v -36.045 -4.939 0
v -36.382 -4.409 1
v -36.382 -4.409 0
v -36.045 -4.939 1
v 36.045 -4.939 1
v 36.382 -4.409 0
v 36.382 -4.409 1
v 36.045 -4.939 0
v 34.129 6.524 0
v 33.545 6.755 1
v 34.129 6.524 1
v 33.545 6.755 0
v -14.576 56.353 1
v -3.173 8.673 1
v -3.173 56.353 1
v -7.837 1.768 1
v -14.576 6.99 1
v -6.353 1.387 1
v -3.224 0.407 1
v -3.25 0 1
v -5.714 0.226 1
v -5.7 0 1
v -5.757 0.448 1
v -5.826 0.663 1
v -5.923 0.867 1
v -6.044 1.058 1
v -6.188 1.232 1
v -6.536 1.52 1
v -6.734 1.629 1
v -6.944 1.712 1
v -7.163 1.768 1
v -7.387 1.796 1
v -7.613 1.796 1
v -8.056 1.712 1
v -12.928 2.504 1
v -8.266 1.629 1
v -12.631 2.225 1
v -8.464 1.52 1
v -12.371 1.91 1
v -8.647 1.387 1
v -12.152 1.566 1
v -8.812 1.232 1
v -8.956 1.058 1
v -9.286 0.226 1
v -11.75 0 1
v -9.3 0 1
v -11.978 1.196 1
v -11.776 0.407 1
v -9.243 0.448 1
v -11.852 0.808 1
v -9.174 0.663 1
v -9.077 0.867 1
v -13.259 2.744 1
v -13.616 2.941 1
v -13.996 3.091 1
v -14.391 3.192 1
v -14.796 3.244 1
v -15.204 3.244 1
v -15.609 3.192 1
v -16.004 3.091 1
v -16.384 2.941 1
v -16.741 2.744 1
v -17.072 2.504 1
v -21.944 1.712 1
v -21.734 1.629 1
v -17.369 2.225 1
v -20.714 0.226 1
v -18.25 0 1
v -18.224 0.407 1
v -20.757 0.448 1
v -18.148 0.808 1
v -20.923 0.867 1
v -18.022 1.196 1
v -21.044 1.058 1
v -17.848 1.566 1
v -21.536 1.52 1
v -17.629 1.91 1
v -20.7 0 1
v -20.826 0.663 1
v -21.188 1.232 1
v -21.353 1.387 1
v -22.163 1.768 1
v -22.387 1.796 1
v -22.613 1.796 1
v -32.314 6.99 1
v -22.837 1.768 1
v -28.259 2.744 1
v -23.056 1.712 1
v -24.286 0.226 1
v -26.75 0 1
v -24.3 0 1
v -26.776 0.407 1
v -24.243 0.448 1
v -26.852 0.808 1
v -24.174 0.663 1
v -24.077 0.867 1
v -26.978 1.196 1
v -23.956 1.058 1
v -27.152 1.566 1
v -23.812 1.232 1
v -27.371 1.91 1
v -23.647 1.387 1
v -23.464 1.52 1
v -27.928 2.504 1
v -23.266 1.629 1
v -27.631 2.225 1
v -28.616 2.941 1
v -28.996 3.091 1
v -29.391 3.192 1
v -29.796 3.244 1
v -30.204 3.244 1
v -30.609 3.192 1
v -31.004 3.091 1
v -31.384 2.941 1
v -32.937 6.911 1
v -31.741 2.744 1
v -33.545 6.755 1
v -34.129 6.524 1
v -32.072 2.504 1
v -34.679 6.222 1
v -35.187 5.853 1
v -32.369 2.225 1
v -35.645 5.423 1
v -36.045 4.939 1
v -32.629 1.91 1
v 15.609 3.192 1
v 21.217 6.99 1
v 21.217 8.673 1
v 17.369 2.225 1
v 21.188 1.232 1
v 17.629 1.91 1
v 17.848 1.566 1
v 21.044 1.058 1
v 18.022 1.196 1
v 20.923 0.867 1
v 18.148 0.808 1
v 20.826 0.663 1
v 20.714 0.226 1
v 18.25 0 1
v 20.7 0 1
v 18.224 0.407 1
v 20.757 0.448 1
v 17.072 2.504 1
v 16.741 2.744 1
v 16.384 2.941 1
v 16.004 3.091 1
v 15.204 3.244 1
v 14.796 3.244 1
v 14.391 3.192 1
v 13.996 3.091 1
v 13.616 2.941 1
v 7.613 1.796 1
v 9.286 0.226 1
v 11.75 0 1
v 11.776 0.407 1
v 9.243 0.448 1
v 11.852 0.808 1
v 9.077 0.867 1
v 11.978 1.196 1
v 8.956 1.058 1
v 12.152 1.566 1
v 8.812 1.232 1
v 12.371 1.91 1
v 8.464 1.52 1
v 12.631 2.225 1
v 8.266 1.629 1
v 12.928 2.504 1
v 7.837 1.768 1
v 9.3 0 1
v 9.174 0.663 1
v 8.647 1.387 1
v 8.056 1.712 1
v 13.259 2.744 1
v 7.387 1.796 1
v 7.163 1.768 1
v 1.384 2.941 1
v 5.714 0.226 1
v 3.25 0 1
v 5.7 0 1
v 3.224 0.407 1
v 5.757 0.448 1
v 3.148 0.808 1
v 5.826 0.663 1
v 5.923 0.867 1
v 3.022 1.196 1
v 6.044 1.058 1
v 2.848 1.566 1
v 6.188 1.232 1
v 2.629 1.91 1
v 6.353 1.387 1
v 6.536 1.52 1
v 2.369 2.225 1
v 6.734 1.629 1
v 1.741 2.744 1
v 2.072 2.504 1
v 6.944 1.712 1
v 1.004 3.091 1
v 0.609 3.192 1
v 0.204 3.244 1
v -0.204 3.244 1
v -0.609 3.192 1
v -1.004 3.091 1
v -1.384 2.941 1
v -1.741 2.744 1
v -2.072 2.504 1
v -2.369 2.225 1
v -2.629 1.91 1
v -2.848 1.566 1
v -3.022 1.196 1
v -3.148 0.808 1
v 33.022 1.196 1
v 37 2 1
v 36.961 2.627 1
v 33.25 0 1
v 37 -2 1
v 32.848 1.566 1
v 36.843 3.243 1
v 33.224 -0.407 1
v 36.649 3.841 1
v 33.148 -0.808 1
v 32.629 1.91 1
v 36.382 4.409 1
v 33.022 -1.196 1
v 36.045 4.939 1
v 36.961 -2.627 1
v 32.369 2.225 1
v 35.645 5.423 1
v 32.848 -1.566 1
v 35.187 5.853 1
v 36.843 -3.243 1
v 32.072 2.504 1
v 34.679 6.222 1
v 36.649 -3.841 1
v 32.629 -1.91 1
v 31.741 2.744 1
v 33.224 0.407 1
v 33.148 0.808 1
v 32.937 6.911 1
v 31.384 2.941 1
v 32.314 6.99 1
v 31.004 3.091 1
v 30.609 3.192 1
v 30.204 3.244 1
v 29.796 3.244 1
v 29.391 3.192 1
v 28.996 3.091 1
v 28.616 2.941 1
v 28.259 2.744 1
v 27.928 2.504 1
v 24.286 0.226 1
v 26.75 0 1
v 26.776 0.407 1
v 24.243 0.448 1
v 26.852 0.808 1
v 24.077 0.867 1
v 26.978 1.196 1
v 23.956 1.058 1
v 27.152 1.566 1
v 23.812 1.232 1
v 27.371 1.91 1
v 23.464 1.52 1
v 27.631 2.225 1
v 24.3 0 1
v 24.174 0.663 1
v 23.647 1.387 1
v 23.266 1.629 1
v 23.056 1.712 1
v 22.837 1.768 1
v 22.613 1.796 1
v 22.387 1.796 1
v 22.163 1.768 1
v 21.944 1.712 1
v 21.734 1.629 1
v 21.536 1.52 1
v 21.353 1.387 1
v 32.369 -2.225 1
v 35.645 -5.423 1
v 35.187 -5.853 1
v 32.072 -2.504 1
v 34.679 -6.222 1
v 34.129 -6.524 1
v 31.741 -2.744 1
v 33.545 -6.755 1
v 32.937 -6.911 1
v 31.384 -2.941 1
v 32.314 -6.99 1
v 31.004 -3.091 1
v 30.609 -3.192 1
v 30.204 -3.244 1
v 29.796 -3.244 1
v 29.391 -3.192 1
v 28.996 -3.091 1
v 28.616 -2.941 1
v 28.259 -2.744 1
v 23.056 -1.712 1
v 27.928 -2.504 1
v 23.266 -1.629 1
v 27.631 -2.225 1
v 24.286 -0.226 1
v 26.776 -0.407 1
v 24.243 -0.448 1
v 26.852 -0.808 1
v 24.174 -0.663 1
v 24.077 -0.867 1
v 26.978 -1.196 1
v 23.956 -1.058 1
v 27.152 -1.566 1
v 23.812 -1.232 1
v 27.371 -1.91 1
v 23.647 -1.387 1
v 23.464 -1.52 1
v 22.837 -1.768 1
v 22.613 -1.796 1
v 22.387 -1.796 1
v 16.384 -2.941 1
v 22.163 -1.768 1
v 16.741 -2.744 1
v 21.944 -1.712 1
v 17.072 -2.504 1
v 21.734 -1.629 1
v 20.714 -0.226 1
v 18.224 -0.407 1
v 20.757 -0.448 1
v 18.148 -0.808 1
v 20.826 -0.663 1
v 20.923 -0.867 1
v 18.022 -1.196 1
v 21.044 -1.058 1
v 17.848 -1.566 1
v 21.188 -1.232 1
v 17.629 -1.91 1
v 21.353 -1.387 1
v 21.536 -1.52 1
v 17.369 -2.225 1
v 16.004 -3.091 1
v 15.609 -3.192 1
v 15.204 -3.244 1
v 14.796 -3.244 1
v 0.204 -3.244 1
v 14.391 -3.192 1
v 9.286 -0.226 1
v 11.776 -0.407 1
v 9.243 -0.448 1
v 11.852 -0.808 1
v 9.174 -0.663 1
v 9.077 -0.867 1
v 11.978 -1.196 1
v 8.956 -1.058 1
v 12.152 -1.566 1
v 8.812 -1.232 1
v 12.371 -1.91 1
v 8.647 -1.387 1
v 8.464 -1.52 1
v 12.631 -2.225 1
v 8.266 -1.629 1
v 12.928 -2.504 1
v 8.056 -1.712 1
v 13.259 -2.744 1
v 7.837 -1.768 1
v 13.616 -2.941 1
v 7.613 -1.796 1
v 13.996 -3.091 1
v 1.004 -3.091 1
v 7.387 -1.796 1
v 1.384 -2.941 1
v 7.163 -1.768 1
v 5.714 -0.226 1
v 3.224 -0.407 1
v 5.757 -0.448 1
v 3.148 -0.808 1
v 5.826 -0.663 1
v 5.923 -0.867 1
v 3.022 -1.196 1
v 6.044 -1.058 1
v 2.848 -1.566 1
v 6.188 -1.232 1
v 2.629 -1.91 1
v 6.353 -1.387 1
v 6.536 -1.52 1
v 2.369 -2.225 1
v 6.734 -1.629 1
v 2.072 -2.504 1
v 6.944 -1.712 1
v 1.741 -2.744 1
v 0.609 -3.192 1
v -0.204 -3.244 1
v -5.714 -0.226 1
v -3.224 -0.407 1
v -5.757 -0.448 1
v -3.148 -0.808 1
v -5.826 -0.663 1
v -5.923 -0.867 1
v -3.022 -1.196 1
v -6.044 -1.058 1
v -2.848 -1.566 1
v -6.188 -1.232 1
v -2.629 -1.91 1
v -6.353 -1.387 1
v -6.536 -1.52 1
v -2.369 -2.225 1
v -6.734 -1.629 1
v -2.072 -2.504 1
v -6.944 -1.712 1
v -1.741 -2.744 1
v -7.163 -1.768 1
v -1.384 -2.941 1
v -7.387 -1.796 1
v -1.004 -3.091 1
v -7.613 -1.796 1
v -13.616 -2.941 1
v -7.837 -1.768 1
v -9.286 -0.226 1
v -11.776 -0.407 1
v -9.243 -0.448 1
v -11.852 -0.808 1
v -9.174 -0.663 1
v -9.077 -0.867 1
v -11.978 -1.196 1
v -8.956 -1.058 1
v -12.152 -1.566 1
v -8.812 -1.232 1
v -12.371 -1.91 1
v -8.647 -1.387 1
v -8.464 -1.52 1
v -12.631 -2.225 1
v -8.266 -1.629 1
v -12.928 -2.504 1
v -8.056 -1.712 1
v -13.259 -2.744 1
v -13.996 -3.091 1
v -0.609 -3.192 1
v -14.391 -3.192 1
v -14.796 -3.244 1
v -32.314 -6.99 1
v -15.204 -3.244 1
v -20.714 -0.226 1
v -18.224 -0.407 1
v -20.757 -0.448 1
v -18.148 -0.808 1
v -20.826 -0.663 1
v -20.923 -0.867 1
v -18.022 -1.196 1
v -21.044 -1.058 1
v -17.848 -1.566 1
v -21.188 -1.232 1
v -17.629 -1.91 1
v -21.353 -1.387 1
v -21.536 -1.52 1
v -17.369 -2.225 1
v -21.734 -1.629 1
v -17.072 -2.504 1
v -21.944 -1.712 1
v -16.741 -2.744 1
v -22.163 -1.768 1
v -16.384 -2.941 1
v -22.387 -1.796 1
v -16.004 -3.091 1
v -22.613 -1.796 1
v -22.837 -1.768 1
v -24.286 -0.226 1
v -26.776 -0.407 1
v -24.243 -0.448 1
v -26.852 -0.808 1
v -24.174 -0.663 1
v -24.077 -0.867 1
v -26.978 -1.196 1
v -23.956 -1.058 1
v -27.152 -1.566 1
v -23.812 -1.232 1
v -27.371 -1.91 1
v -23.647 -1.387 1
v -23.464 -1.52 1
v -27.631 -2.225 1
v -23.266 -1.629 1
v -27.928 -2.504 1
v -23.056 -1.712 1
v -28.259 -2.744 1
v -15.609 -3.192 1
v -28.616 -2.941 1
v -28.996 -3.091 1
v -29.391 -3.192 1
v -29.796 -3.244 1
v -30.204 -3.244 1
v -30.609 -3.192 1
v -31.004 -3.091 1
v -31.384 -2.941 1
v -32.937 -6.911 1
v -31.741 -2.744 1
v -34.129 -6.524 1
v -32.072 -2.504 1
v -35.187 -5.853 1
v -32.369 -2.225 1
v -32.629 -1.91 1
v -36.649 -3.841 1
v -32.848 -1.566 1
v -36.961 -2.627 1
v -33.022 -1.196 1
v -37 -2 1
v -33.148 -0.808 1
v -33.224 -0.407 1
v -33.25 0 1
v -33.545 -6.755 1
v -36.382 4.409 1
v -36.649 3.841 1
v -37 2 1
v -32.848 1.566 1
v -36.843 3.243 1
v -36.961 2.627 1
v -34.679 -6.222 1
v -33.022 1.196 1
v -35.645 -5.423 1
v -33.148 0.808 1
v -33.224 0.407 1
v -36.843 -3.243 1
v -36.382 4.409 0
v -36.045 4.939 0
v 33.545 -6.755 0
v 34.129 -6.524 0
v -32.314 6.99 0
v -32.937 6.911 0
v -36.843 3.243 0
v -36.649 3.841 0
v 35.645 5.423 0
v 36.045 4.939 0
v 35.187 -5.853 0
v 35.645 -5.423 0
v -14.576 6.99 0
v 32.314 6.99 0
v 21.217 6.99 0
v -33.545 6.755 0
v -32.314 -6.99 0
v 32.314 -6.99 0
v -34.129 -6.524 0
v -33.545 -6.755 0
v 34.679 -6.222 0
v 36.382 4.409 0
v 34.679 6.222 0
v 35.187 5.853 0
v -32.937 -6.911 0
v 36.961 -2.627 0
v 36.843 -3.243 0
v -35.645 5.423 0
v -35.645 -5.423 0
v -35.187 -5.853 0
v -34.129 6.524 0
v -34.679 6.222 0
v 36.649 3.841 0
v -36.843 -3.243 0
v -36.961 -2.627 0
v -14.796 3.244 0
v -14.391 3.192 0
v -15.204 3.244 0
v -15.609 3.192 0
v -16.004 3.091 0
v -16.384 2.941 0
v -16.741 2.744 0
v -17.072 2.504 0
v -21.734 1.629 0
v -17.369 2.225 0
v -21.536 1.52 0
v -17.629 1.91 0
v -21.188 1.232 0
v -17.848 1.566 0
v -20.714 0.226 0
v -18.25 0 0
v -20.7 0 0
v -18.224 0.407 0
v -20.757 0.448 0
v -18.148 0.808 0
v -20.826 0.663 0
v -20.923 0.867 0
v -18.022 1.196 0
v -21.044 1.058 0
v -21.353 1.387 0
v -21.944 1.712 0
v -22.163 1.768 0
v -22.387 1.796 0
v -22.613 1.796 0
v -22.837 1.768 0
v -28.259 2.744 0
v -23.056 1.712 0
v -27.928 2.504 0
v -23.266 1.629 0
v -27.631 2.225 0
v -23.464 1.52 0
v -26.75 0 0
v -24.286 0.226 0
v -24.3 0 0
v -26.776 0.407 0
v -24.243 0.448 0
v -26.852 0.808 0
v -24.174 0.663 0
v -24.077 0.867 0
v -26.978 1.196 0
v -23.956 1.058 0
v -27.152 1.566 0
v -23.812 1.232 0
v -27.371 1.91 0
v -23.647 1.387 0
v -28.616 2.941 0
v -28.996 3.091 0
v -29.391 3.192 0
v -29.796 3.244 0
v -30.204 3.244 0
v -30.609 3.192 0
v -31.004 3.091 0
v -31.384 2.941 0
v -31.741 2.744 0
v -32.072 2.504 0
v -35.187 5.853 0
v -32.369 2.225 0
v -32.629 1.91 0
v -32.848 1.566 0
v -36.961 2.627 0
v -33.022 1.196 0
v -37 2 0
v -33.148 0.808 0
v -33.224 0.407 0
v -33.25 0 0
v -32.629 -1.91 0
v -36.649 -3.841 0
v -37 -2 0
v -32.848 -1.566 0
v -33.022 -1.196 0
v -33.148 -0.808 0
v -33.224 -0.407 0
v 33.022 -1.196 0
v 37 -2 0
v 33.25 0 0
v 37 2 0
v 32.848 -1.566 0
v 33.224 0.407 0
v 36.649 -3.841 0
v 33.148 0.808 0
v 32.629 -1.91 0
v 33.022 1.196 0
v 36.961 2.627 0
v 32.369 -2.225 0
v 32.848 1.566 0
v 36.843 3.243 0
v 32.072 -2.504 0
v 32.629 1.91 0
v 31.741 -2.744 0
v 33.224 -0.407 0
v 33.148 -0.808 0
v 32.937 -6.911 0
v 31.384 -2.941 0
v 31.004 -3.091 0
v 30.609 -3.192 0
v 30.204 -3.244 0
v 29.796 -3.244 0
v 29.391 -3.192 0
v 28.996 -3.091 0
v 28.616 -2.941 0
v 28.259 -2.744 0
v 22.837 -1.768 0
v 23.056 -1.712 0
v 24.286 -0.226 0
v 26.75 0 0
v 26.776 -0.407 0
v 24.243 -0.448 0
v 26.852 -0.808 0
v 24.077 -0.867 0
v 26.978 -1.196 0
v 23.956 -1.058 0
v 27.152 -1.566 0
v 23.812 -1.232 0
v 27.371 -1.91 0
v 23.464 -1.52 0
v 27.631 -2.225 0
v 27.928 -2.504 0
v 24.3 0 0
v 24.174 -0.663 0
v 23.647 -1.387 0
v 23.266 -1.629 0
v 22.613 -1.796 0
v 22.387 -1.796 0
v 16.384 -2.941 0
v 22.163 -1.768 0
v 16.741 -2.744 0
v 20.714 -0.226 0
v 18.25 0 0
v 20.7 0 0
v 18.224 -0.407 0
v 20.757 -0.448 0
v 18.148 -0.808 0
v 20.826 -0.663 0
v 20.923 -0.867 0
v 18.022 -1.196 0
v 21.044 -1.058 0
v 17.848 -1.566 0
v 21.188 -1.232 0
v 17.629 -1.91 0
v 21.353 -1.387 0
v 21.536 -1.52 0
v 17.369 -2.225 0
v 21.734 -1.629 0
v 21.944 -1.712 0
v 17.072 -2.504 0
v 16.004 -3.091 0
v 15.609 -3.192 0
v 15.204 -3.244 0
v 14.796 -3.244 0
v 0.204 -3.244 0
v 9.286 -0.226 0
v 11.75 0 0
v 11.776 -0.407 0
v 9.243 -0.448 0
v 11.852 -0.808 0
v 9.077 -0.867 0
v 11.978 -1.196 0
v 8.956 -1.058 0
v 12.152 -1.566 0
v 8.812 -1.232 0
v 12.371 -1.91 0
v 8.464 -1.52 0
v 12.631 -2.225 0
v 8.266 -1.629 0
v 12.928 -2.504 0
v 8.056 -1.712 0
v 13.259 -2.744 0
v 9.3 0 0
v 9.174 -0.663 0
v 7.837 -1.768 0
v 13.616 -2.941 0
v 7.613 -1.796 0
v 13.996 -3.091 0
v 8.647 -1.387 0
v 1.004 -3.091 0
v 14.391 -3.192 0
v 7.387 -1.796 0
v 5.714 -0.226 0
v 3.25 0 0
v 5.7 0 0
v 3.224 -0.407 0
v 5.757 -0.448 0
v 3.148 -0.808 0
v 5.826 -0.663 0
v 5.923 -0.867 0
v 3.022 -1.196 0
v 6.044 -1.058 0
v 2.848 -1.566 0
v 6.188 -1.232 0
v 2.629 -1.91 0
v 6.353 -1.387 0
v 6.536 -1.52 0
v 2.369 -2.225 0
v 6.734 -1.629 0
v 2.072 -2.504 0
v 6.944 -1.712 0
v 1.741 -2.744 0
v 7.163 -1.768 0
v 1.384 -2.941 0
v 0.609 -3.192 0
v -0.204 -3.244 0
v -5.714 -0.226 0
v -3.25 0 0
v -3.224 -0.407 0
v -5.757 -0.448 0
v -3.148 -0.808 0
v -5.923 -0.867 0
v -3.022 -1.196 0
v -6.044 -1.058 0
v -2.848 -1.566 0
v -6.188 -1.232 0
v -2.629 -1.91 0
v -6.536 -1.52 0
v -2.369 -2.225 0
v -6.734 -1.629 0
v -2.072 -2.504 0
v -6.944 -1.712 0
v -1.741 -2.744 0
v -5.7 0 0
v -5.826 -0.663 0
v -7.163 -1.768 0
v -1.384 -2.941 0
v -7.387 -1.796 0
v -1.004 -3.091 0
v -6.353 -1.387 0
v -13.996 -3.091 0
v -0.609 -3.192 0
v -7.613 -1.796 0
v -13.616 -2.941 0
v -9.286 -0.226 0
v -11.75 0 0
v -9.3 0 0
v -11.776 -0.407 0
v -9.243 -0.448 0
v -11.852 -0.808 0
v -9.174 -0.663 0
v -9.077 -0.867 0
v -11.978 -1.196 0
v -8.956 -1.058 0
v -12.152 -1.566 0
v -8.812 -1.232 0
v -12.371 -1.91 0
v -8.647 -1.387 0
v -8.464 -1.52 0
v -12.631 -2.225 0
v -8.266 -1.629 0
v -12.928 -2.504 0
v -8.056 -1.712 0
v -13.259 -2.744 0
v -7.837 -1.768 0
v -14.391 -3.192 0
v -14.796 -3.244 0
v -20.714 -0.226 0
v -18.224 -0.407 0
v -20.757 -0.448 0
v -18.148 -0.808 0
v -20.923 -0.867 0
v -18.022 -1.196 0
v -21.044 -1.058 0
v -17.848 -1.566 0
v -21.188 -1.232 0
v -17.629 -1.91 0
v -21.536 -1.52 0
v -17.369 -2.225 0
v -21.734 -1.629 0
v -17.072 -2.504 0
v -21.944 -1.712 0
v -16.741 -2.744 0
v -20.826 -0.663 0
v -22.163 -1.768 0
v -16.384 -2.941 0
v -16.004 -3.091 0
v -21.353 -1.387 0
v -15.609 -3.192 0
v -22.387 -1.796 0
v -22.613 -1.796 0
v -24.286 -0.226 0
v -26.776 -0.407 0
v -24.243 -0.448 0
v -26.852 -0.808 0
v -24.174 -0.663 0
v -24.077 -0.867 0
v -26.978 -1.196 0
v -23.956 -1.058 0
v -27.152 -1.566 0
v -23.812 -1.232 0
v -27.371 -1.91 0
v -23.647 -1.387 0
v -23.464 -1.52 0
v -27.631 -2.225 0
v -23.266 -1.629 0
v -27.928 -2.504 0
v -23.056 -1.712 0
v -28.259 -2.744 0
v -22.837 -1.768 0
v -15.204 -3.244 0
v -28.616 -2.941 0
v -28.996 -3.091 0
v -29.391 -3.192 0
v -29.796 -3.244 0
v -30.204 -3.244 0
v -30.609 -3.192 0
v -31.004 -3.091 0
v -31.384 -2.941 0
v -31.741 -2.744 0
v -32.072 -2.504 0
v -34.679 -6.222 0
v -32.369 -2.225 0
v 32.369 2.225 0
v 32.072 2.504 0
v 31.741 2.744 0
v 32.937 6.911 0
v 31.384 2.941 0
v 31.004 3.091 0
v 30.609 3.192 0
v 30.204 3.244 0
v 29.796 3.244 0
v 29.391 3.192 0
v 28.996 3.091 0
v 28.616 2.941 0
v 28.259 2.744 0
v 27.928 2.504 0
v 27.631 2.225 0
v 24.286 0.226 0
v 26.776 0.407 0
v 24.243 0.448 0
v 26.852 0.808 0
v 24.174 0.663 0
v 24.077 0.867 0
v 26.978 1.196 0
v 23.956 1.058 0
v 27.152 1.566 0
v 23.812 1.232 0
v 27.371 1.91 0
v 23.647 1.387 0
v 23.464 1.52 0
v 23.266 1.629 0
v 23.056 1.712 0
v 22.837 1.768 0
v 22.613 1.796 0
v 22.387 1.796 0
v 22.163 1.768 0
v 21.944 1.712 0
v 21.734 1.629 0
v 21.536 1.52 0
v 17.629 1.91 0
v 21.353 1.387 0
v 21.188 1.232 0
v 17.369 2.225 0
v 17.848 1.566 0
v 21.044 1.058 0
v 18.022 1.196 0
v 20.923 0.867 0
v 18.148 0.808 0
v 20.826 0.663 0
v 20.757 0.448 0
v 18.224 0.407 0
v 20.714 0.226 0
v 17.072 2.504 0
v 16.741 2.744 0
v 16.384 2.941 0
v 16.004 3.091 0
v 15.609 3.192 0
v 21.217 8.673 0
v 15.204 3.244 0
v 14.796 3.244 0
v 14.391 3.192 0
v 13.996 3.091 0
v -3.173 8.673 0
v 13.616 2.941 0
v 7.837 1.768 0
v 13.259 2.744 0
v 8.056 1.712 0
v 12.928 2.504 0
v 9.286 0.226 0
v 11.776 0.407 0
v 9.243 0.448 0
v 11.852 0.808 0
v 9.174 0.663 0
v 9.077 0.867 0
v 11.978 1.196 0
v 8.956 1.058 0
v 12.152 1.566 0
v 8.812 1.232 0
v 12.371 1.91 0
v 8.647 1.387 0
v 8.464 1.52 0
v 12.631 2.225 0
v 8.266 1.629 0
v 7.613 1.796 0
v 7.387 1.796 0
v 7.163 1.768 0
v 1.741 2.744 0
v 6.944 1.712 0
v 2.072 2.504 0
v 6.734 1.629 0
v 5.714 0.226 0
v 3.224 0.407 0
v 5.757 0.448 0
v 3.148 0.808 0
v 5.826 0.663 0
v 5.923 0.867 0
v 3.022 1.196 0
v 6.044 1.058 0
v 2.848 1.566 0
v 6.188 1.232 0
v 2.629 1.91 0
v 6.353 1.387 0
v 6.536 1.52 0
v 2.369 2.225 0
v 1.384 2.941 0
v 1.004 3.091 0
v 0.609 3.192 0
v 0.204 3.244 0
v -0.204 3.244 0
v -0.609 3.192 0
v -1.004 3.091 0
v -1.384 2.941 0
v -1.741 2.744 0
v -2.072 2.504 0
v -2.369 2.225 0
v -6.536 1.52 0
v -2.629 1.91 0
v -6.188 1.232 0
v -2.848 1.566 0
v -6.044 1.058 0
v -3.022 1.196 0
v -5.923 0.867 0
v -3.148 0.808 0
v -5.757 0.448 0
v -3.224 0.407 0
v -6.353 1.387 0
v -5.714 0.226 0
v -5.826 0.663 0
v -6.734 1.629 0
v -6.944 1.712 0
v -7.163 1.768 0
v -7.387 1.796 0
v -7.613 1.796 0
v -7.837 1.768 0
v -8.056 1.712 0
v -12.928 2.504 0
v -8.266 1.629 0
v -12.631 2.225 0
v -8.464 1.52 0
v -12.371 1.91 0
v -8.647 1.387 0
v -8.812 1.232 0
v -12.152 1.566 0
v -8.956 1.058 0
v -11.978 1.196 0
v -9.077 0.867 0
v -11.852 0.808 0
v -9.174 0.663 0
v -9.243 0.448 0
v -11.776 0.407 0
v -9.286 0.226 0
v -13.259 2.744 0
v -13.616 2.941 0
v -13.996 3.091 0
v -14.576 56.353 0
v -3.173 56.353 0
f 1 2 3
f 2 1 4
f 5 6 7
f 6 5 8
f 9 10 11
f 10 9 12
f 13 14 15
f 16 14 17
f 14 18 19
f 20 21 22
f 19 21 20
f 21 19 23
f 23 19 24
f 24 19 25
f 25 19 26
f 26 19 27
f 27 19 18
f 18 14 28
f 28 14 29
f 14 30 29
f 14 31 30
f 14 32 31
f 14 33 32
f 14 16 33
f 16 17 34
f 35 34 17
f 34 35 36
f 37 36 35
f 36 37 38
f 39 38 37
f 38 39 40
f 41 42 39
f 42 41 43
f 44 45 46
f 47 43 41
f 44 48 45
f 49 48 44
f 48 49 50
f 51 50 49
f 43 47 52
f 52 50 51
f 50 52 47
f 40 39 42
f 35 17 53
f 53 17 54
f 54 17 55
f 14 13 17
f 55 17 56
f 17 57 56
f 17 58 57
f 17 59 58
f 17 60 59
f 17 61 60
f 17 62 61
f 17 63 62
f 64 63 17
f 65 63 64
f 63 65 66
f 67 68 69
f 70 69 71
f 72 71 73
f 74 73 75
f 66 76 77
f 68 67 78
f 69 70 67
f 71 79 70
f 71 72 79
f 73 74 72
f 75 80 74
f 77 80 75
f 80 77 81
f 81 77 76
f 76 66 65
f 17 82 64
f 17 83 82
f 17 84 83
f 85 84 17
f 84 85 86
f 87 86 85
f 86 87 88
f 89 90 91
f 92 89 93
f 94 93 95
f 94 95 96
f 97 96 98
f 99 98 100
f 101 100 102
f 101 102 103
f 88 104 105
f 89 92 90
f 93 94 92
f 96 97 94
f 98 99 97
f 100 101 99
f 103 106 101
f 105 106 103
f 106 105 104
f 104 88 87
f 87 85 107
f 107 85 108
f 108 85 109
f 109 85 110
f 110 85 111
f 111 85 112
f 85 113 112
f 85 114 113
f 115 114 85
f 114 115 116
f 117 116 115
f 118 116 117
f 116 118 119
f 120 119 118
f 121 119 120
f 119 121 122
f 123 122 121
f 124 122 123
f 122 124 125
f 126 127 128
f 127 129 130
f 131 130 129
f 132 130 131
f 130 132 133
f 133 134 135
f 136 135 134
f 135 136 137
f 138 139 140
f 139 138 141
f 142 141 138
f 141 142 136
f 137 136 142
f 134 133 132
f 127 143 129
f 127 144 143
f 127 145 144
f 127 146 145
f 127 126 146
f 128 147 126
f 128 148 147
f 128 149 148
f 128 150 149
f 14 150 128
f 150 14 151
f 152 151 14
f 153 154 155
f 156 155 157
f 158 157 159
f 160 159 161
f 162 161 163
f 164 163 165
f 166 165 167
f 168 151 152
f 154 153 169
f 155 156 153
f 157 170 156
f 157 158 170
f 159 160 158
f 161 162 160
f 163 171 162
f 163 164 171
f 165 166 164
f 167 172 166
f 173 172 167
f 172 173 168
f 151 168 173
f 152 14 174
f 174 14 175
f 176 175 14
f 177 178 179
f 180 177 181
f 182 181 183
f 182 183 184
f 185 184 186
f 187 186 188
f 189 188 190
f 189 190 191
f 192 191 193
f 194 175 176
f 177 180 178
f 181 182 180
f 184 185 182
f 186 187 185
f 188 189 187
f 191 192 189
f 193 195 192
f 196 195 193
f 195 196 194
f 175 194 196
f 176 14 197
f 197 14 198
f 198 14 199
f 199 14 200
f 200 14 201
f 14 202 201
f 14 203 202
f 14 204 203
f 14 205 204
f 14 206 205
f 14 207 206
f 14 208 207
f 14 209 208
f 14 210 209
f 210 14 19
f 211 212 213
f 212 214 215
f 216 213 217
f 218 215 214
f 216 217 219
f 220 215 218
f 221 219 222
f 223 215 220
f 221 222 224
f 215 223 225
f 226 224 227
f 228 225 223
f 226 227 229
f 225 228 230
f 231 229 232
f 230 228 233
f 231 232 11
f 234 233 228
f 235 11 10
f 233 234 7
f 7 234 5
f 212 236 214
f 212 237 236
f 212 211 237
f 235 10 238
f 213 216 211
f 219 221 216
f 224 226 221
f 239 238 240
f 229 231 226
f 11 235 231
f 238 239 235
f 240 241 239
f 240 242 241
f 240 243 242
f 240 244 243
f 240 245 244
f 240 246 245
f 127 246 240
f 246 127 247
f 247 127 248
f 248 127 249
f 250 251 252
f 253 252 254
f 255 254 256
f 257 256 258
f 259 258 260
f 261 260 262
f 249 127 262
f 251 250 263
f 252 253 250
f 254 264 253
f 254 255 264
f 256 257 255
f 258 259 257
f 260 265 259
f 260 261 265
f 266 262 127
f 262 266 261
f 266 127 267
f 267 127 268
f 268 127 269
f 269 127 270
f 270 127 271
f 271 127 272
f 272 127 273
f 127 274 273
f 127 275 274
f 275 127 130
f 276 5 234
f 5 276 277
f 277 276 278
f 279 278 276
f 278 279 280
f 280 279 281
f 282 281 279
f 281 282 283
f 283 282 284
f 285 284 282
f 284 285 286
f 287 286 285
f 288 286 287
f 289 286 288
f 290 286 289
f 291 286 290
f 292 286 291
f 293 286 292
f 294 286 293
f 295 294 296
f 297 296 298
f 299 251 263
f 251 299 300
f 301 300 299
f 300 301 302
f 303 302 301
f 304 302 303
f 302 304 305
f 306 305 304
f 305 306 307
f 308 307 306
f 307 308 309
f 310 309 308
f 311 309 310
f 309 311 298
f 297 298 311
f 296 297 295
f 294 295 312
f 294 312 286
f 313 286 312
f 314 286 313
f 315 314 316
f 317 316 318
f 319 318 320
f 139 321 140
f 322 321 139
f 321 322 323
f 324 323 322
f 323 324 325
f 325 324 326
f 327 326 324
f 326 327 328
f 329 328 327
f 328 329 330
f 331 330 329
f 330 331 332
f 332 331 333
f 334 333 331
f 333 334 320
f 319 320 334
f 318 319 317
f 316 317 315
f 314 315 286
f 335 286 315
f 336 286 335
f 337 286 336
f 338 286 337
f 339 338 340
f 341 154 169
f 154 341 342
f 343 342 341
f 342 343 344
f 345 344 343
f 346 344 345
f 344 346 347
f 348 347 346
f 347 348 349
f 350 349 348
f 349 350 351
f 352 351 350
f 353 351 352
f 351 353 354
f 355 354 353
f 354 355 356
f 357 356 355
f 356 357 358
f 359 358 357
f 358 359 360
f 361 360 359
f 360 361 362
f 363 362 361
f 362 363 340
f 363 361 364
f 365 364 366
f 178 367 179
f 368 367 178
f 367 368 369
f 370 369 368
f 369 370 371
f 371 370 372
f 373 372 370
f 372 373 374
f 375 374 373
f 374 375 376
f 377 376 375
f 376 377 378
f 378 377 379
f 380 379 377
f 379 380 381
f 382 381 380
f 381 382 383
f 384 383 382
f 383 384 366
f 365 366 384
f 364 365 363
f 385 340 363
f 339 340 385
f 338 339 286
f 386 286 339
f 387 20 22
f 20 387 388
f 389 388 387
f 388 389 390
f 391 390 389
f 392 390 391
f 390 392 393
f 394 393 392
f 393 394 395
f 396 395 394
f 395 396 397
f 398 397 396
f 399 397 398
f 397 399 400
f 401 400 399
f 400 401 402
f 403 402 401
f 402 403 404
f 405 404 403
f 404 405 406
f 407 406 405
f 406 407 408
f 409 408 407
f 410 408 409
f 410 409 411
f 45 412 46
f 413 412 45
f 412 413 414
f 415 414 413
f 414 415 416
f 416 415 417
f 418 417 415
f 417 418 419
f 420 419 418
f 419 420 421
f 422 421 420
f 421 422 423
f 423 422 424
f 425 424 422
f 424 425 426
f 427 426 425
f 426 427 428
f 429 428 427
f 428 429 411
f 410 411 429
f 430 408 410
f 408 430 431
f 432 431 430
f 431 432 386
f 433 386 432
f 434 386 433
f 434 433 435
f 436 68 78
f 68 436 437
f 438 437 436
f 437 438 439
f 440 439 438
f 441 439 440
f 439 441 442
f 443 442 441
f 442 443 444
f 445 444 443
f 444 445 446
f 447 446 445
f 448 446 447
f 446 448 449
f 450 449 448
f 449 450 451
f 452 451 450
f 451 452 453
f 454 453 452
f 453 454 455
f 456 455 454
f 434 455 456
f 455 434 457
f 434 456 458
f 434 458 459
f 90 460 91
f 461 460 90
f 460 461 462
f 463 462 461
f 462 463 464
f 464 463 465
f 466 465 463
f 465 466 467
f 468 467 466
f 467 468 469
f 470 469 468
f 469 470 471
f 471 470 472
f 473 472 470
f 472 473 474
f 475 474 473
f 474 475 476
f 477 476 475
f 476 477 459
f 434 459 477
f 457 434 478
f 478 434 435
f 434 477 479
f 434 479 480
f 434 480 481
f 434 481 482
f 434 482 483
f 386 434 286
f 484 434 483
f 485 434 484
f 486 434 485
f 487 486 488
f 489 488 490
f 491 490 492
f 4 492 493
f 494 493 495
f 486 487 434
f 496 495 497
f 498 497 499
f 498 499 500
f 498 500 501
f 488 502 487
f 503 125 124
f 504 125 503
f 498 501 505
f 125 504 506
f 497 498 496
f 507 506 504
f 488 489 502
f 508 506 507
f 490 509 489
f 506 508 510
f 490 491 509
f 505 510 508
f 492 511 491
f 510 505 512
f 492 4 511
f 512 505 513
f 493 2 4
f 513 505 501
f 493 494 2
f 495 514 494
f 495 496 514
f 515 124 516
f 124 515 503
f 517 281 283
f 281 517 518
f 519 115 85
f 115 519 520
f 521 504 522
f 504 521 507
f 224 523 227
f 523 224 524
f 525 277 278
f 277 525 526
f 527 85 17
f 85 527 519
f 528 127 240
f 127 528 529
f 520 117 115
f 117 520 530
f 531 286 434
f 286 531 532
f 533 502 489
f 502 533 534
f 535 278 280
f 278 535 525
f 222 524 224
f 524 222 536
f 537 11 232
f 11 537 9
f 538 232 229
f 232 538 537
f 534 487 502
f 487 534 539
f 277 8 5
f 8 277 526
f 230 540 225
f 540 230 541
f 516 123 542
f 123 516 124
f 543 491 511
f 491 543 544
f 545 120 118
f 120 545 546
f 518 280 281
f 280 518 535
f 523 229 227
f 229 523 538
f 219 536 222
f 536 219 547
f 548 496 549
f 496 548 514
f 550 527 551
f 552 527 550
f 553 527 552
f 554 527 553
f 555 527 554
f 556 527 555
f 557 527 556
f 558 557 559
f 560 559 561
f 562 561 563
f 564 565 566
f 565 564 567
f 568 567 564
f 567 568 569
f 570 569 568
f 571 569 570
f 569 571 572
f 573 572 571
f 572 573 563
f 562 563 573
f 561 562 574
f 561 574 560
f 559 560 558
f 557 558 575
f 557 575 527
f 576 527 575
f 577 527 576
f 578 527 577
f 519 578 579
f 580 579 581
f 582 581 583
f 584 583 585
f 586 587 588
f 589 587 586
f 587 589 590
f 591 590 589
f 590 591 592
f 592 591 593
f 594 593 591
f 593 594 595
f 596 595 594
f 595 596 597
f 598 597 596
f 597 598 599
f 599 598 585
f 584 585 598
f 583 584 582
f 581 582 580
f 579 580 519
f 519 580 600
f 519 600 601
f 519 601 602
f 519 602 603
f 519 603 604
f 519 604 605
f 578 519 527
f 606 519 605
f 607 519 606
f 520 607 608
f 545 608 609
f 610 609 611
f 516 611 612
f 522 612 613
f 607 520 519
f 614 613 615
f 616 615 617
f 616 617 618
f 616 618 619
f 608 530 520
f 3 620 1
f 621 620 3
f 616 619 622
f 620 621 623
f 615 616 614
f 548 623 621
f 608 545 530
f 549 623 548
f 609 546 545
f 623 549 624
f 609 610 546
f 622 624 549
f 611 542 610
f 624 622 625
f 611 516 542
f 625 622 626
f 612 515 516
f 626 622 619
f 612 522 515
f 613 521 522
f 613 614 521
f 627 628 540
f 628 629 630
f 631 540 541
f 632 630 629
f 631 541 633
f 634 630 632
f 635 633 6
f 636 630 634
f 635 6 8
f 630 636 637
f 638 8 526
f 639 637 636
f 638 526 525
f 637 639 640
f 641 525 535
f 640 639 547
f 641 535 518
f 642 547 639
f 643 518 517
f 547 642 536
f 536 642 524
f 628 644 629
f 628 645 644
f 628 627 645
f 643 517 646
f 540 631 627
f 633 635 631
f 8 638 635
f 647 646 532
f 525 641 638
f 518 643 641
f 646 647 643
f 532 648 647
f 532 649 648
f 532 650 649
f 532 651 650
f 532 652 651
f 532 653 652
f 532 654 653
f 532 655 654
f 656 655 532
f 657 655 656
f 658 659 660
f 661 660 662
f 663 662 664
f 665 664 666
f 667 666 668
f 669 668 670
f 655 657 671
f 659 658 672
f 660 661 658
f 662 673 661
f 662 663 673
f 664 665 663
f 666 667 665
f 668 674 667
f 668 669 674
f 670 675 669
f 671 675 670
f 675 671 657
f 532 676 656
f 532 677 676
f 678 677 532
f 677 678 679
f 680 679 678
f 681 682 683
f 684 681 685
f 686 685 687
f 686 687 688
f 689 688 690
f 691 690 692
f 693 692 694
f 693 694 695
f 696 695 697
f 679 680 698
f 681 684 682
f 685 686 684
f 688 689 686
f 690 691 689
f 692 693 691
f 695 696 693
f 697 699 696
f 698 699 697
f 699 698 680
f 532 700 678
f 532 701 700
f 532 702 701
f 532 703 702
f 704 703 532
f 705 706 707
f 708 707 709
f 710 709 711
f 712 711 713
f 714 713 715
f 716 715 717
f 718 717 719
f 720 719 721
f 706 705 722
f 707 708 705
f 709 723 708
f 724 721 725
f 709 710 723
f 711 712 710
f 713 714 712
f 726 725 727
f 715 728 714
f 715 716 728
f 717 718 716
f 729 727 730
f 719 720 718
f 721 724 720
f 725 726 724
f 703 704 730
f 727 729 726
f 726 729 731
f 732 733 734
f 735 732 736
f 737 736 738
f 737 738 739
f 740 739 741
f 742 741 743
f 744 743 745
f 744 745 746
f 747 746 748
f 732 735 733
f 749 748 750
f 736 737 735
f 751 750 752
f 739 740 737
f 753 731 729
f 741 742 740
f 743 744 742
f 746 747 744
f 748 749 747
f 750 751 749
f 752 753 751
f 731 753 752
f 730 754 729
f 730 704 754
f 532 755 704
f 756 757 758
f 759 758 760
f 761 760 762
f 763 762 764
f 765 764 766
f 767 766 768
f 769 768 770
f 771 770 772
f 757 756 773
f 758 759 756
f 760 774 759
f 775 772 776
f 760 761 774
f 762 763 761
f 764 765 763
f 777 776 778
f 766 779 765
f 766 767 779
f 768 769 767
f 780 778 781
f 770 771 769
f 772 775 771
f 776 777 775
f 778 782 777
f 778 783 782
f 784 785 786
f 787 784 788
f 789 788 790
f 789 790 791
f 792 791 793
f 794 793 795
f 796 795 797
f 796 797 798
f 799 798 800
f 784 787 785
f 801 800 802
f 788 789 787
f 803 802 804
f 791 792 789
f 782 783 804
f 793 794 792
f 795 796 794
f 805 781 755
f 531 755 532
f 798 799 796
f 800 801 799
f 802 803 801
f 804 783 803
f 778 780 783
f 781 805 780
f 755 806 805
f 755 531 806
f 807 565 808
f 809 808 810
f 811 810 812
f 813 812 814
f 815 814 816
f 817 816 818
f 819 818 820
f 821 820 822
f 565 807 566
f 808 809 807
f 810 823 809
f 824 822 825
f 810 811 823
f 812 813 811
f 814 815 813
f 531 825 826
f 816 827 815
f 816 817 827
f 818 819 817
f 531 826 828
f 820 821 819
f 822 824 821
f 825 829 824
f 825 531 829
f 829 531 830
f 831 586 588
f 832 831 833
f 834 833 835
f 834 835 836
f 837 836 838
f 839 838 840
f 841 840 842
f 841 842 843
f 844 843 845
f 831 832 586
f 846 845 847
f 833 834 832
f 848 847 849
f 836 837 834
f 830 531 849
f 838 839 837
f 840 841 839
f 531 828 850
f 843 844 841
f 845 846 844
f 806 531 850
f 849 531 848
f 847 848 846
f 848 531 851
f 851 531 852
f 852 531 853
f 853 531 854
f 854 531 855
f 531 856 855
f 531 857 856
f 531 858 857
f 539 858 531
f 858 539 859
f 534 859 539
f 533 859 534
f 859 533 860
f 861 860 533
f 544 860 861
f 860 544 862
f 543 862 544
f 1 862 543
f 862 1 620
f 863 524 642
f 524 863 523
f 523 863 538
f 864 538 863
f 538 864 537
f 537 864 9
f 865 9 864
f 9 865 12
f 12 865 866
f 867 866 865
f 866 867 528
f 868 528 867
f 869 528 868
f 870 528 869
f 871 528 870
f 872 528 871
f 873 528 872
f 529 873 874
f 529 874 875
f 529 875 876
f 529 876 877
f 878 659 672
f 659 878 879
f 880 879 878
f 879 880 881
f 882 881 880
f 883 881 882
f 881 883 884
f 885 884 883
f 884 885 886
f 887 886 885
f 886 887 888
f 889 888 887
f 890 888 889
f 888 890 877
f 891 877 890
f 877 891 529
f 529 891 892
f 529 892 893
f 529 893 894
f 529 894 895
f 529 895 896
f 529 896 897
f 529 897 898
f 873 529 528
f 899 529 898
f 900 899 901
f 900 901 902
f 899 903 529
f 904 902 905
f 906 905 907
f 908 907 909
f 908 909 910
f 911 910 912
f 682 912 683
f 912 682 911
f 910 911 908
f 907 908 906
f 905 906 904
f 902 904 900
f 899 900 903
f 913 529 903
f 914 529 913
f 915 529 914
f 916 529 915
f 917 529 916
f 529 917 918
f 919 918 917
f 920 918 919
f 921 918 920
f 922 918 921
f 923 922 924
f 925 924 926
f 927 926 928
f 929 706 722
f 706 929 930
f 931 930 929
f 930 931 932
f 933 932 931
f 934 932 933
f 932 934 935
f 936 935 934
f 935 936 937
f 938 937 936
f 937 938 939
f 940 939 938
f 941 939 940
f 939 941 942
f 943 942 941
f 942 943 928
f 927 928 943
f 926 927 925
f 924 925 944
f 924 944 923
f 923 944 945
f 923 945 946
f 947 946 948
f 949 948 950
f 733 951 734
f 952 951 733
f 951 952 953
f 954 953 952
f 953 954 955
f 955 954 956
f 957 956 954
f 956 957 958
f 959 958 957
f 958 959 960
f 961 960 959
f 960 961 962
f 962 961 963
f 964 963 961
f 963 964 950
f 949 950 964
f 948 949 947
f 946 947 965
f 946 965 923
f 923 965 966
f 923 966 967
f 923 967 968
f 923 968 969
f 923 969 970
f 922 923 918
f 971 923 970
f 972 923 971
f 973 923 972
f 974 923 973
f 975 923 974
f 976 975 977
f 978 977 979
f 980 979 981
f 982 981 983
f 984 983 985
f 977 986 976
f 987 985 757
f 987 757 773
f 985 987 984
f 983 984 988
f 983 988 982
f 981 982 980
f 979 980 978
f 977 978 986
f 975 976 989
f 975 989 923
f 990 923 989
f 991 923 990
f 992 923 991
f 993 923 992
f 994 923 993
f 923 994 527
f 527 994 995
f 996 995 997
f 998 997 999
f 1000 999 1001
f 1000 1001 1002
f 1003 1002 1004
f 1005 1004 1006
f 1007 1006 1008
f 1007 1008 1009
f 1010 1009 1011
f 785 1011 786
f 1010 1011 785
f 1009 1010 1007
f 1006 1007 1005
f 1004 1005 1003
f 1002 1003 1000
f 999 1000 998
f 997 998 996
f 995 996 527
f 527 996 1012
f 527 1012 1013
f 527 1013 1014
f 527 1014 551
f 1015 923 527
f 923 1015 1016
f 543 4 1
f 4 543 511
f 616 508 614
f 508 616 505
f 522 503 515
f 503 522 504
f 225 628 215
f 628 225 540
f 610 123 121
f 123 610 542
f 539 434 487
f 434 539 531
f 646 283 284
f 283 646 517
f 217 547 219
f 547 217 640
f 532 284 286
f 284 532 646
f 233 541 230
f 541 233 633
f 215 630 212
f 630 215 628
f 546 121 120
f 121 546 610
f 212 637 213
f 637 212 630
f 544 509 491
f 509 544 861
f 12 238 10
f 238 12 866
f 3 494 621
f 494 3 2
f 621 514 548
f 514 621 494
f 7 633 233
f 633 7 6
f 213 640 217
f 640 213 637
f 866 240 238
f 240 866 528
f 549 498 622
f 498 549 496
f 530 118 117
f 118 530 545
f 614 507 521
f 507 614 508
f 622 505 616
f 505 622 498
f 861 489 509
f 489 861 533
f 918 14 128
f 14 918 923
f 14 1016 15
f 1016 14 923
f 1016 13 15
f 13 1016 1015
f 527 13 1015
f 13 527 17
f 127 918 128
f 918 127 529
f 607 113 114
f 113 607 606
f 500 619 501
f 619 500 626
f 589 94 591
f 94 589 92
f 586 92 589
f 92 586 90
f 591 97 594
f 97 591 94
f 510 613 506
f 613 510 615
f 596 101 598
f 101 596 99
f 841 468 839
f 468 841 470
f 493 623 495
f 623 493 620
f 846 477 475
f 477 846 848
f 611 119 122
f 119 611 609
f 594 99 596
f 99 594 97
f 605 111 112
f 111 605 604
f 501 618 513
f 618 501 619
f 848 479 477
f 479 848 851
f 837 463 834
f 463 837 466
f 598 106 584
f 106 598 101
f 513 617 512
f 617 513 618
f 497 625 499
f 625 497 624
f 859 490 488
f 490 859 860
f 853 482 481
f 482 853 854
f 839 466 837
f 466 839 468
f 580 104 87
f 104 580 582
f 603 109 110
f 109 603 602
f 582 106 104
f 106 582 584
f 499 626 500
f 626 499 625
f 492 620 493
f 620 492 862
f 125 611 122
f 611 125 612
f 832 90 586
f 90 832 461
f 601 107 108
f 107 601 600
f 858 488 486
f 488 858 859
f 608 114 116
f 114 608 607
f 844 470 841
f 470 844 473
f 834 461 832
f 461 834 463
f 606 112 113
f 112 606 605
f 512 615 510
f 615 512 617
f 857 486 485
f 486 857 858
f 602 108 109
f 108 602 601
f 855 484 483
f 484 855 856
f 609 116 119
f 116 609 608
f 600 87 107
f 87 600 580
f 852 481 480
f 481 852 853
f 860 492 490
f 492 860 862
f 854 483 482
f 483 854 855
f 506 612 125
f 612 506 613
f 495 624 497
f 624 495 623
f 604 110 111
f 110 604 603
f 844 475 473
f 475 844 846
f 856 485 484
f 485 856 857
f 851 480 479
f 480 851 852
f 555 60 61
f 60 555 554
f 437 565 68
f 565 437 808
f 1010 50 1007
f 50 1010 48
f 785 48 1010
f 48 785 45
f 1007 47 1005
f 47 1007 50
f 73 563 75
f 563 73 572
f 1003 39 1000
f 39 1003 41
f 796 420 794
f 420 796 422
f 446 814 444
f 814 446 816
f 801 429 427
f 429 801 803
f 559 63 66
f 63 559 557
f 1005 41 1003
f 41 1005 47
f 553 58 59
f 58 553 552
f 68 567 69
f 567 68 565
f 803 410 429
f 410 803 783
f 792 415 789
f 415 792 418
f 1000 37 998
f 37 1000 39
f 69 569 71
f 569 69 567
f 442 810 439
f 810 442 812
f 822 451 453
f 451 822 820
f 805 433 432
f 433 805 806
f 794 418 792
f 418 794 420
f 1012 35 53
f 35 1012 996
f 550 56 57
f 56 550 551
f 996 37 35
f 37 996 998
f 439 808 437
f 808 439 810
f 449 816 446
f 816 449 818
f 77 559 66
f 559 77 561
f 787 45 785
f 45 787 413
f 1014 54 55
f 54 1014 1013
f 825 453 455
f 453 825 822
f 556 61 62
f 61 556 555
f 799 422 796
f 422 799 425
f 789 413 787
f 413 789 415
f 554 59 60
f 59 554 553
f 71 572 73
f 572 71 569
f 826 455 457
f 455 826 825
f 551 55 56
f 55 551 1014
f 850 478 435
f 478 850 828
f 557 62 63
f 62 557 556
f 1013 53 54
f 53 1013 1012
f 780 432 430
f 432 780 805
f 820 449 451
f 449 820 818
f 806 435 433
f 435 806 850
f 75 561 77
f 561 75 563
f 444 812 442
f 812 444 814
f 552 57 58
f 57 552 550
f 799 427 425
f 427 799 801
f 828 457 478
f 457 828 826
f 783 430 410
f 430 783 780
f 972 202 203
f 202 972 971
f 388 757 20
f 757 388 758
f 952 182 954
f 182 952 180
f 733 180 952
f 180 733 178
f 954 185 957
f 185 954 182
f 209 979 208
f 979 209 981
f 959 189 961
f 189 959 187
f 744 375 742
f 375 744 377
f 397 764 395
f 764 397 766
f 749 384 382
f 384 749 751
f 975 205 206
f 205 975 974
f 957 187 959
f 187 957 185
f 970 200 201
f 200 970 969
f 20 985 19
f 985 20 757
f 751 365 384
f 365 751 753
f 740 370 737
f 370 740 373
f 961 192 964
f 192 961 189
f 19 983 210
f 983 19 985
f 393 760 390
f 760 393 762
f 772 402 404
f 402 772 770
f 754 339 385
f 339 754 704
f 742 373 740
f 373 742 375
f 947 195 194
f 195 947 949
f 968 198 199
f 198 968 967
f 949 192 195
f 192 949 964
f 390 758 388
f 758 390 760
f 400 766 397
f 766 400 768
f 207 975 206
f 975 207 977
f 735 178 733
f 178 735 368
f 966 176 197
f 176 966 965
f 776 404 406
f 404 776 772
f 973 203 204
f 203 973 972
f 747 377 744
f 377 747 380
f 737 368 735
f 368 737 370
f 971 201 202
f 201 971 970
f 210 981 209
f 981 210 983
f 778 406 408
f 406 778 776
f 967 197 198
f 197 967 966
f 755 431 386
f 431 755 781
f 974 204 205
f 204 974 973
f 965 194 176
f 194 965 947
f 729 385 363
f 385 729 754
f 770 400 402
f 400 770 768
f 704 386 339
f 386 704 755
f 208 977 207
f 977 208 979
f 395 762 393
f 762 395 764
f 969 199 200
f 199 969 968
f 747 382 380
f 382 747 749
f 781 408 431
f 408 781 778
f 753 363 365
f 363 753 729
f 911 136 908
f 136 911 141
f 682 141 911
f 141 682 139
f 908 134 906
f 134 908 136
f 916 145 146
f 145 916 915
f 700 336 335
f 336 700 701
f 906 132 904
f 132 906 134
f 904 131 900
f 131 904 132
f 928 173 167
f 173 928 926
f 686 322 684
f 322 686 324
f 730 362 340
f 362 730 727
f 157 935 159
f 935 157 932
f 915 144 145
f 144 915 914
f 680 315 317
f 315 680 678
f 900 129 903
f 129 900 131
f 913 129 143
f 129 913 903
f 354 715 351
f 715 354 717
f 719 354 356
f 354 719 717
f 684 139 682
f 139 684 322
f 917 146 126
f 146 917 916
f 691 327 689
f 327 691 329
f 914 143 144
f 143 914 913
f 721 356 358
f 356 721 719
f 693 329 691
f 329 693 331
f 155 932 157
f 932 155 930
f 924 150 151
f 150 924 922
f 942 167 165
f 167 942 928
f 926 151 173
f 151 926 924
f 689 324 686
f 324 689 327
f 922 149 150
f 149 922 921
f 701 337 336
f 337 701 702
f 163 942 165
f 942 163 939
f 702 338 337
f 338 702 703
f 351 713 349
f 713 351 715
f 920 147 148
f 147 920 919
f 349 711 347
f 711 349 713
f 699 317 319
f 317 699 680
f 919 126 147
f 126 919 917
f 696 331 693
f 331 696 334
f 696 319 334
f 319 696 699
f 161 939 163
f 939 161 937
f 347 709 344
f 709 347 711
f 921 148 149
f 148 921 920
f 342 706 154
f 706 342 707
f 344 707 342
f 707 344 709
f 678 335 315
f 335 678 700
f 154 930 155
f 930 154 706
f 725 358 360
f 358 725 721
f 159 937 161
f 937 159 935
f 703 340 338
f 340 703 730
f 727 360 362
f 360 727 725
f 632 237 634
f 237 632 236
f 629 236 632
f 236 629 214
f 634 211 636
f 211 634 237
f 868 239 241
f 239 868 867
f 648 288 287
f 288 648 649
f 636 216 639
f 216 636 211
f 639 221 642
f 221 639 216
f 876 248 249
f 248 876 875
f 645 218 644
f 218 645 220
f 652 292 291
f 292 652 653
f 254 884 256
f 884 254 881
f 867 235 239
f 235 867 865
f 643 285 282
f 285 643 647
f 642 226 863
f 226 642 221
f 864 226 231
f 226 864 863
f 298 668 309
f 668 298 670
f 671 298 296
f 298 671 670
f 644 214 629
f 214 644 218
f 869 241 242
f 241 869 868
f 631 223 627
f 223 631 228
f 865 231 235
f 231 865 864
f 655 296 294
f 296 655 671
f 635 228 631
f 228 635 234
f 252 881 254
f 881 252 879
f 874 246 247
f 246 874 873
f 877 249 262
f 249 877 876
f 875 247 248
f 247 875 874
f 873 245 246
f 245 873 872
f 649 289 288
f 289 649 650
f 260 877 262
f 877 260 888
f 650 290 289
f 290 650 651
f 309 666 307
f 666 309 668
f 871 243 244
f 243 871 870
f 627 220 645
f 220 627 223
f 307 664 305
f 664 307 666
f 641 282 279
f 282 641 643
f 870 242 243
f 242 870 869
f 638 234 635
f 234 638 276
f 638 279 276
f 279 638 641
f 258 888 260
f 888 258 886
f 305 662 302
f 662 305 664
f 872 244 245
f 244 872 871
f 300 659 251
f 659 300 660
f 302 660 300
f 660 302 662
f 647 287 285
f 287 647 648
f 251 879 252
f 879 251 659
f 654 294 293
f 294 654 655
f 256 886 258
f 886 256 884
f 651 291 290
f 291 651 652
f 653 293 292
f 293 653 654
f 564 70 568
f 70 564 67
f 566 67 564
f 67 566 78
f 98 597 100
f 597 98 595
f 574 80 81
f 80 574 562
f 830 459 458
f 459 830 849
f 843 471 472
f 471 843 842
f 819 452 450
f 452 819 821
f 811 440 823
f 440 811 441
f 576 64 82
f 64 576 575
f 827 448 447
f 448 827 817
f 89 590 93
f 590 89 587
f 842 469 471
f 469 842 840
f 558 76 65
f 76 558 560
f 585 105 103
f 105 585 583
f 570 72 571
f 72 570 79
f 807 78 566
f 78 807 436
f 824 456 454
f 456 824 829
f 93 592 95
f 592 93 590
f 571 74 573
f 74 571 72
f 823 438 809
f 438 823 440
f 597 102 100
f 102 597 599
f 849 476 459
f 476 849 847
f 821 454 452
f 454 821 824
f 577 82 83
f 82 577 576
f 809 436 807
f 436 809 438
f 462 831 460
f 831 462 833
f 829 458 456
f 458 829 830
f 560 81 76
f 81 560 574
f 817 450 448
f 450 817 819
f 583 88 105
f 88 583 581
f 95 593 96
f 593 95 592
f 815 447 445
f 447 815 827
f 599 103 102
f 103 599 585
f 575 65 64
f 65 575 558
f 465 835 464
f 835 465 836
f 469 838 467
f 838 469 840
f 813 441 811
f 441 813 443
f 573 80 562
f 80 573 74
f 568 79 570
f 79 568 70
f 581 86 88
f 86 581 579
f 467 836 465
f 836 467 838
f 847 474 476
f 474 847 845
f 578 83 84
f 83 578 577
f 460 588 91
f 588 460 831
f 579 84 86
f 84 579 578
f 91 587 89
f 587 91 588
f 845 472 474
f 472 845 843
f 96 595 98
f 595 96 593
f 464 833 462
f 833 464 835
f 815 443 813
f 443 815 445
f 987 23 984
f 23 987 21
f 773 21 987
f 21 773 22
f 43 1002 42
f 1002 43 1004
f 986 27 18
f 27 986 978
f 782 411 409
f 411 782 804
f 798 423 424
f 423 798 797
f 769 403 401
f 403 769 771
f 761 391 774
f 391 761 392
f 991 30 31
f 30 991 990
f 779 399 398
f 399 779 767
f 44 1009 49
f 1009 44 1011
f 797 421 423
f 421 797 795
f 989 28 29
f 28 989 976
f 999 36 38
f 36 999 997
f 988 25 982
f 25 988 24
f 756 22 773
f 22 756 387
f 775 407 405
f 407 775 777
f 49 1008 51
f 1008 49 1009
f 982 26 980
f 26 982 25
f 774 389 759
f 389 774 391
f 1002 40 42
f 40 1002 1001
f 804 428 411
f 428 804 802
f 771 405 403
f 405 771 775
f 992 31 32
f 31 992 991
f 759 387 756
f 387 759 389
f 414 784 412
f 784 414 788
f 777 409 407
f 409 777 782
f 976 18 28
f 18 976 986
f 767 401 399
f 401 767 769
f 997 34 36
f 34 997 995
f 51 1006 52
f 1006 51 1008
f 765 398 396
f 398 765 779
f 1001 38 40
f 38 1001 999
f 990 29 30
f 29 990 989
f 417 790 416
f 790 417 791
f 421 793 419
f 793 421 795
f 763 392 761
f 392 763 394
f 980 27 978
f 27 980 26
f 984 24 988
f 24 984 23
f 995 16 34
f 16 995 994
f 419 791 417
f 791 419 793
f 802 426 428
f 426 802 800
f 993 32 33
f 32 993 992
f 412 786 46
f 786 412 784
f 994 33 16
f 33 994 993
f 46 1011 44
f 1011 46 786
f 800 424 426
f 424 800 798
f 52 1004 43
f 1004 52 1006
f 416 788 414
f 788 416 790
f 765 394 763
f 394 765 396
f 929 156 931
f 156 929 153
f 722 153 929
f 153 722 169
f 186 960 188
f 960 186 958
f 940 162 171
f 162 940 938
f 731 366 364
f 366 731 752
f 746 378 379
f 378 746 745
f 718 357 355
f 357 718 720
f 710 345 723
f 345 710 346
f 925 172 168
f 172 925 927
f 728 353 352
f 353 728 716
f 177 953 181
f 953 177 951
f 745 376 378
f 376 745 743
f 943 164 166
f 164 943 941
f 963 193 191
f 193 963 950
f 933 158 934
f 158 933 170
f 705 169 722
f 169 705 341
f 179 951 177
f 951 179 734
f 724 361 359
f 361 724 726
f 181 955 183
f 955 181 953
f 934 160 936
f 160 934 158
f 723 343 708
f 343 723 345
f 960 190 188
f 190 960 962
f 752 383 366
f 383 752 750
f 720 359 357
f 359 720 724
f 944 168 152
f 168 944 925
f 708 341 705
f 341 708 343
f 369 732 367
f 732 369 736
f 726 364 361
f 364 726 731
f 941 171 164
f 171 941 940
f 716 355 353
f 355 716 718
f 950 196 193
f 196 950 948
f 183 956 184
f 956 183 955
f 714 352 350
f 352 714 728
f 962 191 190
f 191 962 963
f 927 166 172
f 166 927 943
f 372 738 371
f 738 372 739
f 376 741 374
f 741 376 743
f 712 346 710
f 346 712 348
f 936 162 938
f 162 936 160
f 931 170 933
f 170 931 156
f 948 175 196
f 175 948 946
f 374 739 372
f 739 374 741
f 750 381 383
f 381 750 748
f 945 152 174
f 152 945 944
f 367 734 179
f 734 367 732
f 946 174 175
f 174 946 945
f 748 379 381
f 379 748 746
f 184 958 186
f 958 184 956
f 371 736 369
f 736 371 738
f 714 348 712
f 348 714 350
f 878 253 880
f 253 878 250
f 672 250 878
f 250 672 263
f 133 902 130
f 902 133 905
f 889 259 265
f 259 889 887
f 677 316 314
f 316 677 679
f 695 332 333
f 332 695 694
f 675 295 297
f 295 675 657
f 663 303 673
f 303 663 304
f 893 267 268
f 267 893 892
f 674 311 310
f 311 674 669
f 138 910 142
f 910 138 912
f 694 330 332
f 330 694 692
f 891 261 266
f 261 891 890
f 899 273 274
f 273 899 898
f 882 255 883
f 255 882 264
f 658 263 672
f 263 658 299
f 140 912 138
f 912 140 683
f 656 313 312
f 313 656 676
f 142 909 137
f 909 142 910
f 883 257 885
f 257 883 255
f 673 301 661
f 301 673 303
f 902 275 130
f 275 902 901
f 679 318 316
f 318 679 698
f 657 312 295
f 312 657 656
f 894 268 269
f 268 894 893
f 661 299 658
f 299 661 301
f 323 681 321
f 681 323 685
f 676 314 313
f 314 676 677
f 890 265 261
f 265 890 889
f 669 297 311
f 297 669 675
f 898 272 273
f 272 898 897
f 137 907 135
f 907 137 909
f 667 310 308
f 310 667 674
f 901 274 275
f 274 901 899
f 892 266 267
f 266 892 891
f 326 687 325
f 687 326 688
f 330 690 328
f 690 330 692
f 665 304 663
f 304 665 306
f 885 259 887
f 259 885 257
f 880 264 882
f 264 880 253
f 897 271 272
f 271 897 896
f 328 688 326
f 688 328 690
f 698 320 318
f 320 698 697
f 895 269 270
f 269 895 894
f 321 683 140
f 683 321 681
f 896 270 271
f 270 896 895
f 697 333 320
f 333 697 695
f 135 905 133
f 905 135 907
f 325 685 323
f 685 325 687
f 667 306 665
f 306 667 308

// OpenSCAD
$fn = 50;


difference() {
	union() {
		hull() {
			translate(v = [-32.0000000000, 2.0000000000, 0]) {
				cylinder(h = 1, r = 5);
			}
			translate(v = [32.0000000000, 2.0000000000, 0]) {
				cylinder(h = 1, r = 5);
			}
			translate(v = [-32.0000000000, -2.0000000000, 0]) {
				cylinder(h = 1, r = 5);
			}
			translate(v = [32.0000000000, -2.0000000000, 0]) {
				cylinder(h = 1, r = 5);
			}
		}
		translate(v = [0, 55, 0]) {
			linear_extrude(height = 1) {
				text(font = "DejaVu Sans Mono:style=Bold", halign = "center", size = 57.0000000000, text = "L", valign = "top");
			}
		}
	}
	union() {
		translate(v = [-30.0000000000, 0.0000000000, 0]) {
			translate(v = [0, 0, -100]) {
				cylinder(h = 200, r = 3.2500000000);
			}
		}
		translate(v = [-15.0000000000, 0.0000000000, 0]) {
			translate(v = [0, 0, -100]) {
				cylinder(h = 200, r = 3.2500000000);
			}
		}
		translate(v = [0, 0, -100]) {
			cylinder(h = 200, r = 3.2500000000);
		}
		translate(v = [15.0000000000, 0.0000000000, 0]) {
			translate(v = [0, 0, -100]) {
				cylinder(h = 200, r = 3.2500000000);
			}
		}
		translate(v = [30.0000000000, 0.0000000000, 0]) {
			translate(v = [0, 0, -100]) {
				cylinder(h = 200, r = 3.2500000000);
			}
		}
		translate(v = [-30.0000000000, 0.0000000000, 0]) {
			translate(v = [0, 0, -100]) {
				cylinder(h = 200, r = 1.8000000000);
			}
		}
		translate(v = [-22.5000000000, 0.0000000000, 0]) {
			translate(v = [0, 0, -100]) {
				cylinder(h = 200, r = 1.8000000000);
			}
		}
		translate(v = [-15.0000000000, 0.0000000000, 0]) {
			translate(v = [0, 0, -100]) {
				cylinder(h = 200, r = 1.8000000000);
			}
		}
		translate(v = [-7.5000000000, 0.0000000000, 0]) {
			translate(v = [0, 0, -100]) {
				cylinder(h = 200, r = 1.8000000000);
			}
		}
		translate(v = [0, 0, -100]) {
			cylinder(h = 200, r = 1.8000000000);
		}
		translate(v = [7.5000000000, 0.0000000000, 0]) {
			translate(v = [0, 0, -100]) {
				cylinder(h = 200, r = 1.8000000000);
			}
		}
		translate(v = [15.0000000000, 0.0000000000, 0]) {
			translate(v = [0, 0, -100]) {
				cylinder(h = 200, r = 1.8000000000);
			}
		}
		translate(v = [22.5000000000, 0.0000000000, 0]) {
			translate(v = [0, 0, -100]) {
				cylinder(h = 200, r = 1.8000000000);
			}
		}
		translate(v = [30.0000000000, 0.0000000000, 0]) {
			translate(v = [0, 0, -100]) {
				cylinder(h = 200, r = 1.8000000000);
			}
		}
	}
}
